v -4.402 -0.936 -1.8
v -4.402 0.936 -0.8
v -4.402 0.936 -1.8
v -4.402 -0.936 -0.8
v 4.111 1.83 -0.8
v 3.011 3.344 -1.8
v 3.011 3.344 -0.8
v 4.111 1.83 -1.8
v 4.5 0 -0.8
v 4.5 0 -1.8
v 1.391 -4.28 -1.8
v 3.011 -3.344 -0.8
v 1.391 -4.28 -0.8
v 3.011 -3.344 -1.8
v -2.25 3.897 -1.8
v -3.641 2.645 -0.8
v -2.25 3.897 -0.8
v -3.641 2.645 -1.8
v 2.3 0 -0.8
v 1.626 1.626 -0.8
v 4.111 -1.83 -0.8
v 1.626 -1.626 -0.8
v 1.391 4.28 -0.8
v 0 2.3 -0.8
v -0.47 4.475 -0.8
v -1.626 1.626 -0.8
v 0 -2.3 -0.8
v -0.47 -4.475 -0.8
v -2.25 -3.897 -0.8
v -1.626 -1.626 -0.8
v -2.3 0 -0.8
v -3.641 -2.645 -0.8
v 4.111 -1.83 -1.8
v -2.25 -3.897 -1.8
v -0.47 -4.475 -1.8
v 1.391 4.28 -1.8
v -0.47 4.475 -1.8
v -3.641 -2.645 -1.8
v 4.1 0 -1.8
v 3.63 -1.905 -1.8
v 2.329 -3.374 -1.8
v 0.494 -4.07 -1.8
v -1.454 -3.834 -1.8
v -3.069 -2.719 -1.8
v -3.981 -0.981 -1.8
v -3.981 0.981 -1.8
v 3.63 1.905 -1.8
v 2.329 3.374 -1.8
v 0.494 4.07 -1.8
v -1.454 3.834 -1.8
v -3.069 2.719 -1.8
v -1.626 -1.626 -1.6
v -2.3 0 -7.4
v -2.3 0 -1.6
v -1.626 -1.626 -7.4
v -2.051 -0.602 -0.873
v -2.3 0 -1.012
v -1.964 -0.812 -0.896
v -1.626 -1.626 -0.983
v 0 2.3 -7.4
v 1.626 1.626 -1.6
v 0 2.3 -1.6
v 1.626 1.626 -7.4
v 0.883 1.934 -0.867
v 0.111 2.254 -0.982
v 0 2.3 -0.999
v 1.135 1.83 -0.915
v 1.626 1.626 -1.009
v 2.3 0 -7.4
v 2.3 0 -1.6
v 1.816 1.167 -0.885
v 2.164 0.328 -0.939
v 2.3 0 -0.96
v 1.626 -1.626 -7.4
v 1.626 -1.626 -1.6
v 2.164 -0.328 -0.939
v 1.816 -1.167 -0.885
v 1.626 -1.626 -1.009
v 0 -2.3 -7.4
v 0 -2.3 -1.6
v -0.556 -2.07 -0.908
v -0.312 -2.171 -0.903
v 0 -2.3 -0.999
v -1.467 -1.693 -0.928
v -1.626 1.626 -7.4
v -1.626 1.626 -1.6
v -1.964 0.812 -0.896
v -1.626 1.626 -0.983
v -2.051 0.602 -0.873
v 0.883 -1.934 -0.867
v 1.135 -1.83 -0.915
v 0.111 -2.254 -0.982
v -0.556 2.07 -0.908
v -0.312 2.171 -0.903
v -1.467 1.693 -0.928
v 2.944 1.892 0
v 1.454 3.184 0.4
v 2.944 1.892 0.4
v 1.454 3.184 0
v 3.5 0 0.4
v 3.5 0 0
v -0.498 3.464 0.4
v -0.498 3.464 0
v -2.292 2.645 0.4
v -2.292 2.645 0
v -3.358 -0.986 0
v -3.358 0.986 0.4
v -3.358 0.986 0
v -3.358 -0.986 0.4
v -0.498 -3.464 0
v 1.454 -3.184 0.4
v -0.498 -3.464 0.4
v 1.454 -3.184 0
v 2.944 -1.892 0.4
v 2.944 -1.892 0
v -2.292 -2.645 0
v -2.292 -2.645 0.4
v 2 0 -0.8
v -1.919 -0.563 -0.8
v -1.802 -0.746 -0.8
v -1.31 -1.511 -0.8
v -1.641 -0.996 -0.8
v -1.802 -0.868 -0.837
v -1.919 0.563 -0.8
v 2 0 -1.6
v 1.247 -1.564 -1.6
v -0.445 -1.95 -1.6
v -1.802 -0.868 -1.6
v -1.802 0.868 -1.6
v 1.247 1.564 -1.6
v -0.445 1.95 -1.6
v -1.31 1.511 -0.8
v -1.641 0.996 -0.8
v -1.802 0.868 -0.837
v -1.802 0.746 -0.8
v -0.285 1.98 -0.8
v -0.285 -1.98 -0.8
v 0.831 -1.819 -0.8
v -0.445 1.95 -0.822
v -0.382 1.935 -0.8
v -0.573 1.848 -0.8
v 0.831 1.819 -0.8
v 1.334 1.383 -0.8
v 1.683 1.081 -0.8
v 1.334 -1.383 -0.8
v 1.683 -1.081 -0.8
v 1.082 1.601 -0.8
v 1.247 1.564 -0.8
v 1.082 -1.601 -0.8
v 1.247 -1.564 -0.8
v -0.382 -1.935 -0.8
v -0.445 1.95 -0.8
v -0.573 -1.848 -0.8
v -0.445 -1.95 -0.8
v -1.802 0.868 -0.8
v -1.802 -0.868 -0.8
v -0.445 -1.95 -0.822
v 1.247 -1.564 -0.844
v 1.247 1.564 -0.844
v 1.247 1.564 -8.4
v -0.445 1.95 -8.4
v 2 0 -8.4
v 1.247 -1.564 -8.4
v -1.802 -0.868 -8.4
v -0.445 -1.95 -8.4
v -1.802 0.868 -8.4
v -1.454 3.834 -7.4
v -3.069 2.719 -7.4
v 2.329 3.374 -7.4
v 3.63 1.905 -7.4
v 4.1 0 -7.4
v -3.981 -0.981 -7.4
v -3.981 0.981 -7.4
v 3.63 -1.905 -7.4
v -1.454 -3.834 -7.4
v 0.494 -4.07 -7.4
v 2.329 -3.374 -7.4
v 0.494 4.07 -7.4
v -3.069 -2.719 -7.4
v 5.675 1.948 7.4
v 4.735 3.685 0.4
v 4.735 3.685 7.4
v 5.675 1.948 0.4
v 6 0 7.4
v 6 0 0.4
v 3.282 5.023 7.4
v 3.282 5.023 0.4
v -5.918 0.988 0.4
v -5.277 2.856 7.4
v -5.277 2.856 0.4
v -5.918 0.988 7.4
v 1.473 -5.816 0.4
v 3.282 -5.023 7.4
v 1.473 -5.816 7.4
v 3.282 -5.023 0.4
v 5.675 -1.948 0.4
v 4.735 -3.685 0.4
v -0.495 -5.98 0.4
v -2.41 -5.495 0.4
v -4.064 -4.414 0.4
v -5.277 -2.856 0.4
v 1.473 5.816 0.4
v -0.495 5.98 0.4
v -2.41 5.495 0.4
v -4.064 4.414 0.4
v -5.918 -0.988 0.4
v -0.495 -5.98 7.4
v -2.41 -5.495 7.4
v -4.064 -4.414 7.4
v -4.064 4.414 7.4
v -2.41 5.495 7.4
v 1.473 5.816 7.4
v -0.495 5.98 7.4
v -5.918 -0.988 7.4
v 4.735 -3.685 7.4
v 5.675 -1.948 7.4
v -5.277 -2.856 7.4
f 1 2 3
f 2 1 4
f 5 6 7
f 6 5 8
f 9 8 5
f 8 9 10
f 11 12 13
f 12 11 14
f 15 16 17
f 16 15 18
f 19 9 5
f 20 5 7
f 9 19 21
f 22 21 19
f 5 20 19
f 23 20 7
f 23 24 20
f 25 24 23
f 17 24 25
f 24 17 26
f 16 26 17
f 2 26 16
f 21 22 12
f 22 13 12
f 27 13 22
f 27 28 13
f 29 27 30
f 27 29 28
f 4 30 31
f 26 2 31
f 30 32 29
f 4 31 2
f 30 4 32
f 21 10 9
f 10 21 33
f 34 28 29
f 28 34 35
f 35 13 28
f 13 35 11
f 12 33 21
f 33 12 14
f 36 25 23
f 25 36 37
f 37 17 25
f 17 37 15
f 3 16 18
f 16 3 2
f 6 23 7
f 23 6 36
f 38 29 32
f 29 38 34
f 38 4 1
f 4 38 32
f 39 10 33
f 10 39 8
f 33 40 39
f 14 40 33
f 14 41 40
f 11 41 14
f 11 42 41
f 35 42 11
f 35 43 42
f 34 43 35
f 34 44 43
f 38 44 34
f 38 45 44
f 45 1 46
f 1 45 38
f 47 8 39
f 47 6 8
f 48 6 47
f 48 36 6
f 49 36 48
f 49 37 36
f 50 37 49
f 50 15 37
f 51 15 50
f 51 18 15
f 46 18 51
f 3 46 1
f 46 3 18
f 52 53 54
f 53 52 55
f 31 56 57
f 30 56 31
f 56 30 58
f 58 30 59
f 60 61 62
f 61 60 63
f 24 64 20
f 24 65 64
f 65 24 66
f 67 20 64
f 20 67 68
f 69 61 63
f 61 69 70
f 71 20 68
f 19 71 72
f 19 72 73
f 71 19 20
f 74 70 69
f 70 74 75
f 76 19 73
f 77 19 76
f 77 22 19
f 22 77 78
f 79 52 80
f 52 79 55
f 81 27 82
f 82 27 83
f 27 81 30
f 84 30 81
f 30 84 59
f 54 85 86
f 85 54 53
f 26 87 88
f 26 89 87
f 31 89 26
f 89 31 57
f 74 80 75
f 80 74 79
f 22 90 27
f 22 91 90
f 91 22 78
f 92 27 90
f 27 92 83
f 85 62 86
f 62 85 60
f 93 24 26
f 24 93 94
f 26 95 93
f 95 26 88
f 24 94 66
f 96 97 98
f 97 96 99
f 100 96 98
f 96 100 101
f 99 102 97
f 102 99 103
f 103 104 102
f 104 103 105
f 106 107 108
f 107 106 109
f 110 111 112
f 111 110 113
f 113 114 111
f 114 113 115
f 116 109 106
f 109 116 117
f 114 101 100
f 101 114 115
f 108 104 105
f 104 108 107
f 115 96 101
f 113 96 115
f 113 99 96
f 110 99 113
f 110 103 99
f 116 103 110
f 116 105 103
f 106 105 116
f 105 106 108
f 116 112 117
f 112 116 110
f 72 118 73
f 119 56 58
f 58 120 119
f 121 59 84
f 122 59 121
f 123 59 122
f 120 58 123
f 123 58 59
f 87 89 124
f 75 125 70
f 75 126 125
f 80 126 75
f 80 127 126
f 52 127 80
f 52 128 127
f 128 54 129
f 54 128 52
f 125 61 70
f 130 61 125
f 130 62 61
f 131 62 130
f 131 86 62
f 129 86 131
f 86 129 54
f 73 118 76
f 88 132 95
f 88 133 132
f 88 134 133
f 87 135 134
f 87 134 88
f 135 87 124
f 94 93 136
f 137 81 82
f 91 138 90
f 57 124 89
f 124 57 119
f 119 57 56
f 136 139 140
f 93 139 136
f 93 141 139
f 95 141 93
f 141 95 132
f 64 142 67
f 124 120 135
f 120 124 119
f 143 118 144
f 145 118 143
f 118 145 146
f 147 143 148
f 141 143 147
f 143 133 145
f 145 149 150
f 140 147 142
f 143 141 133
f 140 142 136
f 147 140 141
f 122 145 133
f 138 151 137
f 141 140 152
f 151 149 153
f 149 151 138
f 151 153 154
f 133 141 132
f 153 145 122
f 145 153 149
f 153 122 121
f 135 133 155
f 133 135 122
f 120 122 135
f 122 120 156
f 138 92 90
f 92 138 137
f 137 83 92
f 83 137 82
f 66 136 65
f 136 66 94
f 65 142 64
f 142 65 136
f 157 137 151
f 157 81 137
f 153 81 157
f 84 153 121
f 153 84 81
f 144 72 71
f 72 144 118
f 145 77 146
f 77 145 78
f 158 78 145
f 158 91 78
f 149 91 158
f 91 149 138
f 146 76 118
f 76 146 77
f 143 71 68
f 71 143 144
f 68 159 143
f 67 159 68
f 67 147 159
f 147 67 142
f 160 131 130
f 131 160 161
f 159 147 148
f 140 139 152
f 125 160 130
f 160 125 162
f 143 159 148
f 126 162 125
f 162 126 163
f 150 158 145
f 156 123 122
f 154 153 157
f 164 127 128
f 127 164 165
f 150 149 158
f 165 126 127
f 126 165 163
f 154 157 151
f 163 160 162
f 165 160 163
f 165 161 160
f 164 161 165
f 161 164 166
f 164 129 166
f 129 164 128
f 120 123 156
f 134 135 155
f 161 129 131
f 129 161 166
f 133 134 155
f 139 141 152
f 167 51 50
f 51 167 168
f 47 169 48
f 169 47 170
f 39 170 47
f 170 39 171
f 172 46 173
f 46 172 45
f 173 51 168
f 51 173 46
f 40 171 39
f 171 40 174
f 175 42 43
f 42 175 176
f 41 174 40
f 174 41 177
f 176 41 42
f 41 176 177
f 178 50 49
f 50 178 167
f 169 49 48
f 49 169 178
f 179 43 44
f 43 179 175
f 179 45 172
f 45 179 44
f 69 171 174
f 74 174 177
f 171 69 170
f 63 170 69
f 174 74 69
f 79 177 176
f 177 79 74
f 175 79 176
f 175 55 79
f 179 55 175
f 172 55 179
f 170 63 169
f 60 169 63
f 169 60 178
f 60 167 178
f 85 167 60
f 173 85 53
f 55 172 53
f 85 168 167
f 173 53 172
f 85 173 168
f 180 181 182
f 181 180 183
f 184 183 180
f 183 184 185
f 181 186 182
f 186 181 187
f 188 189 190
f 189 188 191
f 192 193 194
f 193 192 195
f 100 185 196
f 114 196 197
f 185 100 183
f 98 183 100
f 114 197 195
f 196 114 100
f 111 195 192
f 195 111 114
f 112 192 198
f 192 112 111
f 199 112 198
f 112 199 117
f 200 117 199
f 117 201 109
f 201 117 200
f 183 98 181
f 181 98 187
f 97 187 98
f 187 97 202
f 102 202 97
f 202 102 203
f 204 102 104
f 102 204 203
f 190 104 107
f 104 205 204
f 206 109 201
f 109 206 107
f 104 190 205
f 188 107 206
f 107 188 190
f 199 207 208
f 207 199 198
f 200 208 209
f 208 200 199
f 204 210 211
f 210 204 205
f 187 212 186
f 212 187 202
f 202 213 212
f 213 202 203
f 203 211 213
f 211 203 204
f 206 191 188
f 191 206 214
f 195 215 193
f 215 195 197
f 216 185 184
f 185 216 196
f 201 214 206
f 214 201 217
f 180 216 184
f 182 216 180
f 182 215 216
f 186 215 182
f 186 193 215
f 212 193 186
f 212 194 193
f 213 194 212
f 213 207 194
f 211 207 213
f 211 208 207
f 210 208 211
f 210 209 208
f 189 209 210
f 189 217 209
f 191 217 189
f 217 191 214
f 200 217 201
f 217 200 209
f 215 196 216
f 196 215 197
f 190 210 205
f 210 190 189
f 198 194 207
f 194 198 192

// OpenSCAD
// Parameters
shaft_diameter_mm = 4.0; //[2.0:8.0:0.1]
shaft_radius_mm = 2.0; //[1.0:4.0:0.05]
length_mm = 10.0; //[5.0:20.0:0.5]
head_diameter_mm = 7.0; //[3.5:14.0:0.1]
head_radius_mm = 3.5; //[1.75:7.0:0.05]
head_height_mm = 2.4; //[1.2:4.8:0.1]
overlap_mm = 0.8; //[0.5:2.0:0.1]
transition_height_mm = 0.8; //[0.4:1.6:0.1]
washer_outer_diameter_mm = 9.0; //[5.0:18.0:0.1]
washer_thickness_mm = 1.0; //[0.5:2.5:0.1]
spacer_height_mm = 6.0; //[3.0:12.0:0.5]
spacer_wall_mm = 1.8; //[0.9:3.6:0.1]
spacer_clearance_mm = 0.3; //[0.1:0.8:0.05]
buzzer_diameter_mm = 12.0; //[6.0:24.0:0.5]
buzzer_height_mm = 7.0; //[3.5:14.0:0.5]
buzzer_offset_x_mm = 0.0; //[-20.0:20.0:0.5]
buzzer_offset_y_mm = 0.0; //[-20.0:20.0:0.5]

// PCB Spacer - complete geometry
module pcb_spacer() {
  color([0.85, 0.85, 0.8]) {
    difference() {
      cylinder(r=shaft_radius_mm + spacer_clearance_mm + spacer_wall_mm, h=spacer_height_mm, center=true);
      translate([0, 0, 0])
        cylinder(r=shaft_radius_mm + spacer_clearance_mm, h=spacer_height_mm + 2*overlap_mm, center=true);
    }
  }
}

// Screw and Washer - complete geometry
module screw_and_washer() {
  color("DimGray") {
    union() {
      // Screw Head
      translate([0, 0, head_height_mm/2])
        cylinder(r=head_radius_mm, h=head_height_mm, center=true);
      // Head to Shaft Transition
      translate([0, 0, -head_height_mm/2 - transition_height_mm/2 + overlap_mm/2])
        cylinder(r1=head_radius_mm, r2=shaft_radius_mm, h=transition_height_mm, center=true);
      // Screw Shaft
      translate([0, 0, -head_height_mm/2 - (length_mm - head_height_mm)/2 + overlap_mm/2])
        cylinder(r=shaft_radius_mm, h=length_mm - head_height_mm, center=true);
      // Washer
      translate([0, 0, -head_height_mm/2 - washer_thickness_mm/2 + overlap_mm/2])
        difference() {
          cylinder(r=washer_outer_diameter_mm/2, h=washer_thickness_mm, center=true);
          cylinder(r=shaft_radius_mm + spacer_clearance_mm, h=washer_thickness_mm + 2*overlap_mm, center=true);
        }
    }
  }
}

// Buzzer - complete geometry
module buzzer() {
  color([0.1, 0.1, 0.6]) {
    translate([buzzer_offset_x_mm, buzzer_offset_y_mm, head_height_mm/2 + buzzer_height_mm/2 - overlap_mm])
      cylinder(r=buzzer_diameter_mm/2, h=buzzer_height_mm, center=true);
  }
}

// Assembly
module assembly() {
  screw_and_washer();
  translate([0, 0, -head_height_mm/2 - washer_thickness_mm - spacer_height_mm/2 + overlap_mm])
    pcb_spacer();
  buzzer();
}

assembly();
